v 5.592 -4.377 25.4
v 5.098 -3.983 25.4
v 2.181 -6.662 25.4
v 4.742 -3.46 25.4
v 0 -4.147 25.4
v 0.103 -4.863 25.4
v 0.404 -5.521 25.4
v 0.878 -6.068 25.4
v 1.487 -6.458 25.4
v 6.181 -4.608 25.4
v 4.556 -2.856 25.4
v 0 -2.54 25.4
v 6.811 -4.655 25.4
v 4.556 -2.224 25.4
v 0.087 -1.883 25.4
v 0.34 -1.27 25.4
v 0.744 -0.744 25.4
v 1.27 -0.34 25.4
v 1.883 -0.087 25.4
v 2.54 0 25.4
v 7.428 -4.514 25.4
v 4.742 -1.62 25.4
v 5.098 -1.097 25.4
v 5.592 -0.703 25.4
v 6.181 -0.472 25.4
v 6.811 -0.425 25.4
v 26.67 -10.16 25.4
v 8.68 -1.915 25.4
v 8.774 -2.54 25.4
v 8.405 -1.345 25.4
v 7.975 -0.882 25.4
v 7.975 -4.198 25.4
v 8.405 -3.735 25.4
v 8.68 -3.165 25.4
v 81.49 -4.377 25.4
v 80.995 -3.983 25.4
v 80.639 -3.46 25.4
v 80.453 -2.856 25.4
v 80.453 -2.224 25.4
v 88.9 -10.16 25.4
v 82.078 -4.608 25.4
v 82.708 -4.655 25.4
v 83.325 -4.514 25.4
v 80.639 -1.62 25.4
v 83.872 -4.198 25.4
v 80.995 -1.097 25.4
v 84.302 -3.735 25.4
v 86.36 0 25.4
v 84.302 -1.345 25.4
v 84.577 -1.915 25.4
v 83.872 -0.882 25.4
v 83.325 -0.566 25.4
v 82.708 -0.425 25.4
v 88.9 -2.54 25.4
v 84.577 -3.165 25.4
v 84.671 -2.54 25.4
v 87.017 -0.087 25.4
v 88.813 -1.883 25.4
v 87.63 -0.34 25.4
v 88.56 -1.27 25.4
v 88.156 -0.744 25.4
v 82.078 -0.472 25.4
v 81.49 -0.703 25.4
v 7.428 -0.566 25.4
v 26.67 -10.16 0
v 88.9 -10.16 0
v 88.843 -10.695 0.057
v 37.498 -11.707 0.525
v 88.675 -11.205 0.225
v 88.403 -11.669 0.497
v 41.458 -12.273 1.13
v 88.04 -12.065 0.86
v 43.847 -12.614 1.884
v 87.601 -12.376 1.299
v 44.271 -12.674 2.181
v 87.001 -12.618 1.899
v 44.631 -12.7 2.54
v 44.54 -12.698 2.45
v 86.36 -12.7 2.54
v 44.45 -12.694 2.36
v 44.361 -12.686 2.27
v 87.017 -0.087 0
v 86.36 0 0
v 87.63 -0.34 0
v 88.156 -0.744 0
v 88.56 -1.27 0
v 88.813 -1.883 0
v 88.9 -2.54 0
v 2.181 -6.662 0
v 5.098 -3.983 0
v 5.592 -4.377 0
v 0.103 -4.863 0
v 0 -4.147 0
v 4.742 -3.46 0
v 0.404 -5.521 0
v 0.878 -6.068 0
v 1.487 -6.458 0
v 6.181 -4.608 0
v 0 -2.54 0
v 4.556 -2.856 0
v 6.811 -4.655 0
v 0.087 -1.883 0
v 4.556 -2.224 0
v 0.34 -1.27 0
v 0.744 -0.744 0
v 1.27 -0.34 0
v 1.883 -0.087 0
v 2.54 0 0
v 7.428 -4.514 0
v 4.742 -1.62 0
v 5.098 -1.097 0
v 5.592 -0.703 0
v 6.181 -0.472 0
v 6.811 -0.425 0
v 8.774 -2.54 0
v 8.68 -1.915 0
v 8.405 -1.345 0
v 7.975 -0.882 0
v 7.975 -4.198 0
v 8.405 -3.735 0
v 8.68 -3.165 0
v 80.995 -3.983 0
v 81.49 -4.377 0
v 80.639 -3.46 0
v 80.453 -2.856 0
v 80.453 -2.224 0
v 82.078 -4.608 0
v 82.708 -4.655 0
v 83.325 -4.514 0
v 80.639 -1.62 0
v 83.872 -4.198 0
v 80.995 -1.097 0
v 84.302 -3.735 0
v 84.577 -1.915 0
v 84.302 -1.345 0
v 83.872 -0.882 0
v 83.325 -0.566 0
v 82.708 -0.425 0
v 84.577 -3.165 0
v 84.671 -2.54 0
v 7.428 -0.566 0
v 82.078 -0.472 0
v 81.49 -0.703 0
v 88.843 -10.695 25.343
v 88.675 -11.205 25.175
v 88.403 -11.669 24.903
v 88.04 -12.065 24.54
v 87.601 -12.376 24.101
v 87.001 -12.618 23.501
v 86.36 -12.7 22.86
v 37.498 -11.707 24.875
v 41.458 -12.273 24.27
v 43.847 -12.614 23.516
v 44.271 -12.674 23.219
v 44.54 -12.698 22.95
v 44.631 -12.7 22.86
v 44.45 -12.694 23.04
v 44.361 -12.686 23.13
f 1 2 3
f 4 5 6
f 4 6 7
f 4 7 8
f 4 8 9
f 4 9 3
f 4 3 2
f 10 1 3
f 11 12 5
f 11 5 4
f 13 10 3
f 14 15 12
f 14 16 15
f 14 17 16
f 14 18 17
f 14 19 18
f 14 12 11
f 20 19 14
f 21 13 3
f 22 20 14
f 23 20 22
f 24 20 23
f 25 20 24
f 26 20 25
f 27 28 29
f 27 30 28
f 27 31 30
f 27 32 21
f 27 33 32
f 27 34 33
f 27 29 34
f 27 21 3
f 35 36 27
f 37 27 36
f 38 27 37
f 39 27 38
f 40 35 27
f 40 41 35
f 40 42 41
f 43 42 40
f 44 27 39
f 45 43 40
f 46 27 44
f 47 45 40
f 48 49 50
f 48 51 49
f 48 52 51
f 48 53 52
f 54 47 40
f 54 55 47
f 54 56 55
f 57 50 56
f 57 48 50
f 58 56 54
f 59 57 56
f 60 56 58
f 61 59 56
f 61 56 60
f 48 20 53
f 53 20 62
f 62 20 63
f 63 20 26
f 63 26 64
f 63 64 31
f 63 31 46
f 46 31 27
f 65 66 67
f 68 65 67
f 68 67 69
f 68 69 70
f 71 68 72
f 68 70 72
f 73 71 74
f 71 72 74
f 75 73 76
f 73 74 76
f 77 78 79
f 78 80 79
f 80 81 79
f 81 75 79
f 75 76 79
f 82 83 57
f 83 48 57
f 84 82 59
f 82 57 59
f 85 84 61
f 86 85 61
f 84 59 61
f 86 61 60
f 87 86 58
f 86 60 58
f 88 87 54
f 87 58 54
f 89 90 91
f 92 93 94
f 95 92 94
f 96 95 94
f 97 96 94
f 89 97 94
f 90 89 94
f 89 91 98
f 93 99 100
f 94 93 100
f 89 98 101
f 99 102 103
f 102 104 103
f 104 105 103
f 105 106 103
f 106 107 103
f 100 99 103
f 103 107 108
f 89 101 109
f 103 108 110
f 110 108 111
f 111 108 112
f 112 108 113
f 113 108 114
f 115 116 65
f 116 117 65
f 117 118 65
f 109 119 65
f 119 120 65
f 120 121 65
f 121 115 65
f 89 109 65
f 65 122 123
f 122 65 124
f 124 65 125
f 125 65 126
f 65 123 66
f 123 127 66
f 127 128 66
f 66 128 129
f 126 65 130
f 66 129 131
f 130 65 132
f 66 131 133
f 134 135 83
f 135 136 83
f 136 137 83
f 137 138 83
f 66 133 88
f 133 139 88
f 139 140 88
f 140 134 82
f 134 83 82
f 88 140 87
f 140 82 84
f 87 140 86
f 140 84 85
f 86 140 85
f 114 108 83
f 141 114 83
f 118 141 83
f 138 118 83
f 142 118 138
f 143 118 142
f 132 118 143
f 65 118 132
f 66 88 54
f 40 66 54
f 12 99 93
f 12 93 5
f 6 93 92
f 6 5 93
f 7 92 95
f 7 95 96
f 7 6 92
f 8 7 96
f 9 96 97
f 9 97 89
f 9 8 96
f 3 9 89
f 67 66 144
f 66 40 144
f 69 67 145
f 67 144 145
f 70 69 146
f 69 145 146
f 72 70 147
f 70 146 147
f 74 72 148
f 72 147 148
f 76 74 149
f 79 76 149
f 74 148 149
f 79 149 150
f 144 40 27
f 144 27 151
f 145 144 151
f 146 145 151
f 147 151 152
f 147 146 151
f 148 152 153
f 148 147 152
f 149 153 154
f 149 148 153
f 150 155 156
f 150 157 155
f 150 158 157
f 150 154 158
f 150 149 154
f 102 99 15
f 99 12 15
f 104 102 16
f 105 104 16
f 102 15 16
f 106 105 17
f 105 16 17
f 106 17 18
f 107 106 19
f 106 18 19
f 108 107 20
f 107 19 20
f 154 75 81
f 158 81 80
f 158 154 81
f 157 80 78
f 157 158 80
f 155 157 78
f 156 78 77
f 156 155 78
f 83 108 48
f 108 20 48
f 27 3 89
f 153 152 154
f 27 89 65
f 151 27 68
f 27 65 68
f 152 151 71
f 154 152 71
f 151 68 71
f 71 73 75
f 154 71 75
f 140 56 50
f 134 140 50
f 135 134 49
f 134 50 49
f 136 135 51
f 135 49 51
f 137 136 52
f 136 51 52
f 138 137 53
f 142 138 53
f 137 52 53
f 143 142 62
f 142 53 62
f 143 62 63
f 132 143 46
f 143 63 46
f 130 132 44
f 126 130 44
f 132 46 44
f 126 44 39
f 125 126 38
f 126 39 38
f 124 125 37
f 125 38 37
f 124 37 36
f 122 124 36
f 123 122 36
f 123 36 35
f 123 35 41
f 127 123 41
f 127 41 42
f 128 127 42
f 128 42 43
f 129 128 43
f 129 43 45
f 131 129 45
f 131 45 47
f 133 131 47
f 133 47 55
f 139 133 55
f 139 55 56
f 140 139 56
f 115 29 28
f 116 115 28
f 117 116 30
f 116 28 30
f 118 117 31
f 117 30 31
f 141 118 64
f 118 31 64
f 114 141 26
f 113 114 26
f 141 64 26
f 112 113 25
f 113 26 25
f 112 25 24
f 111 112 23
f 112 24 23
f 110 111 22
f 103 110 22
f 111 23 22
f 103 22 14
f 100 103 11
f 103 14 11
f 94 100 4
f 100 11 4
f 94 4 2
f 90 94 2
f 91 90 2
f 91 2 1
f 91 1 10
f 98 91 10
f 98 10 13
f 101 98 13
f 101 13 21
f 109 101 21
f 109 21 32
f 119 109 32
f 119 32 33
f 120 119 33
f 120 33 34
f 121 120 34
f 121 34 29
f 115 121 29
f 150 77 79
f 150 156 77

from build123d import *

# Parameters (mm, degrees)
F0_W     = 88.9
F0_H     = 25.4
F1_DEPTH = 12.7
F3_DEPTH = 25.4
F4_R     = 2.54
F5_R     = 2.1209
F6_DEPTH = 26.162


with BuildPart() as f1:
    # F0 (on Front) → F1 (new body)
    with BuildSketch(Plane.XZ):
        with Locations((44.45, 12.7)):
            Rectangle(F0_W, F0_H)
    extrude(amount=F1_DEPTH)

    # F2 (on face) → F3 (cut)
    with BuildSketch(Plane(origin=(0, 0, 0), x_dir=(1, 0, 0), z_dir=(0, 0, -1))):
        Polygon((0, 6.35), (44.45, 12.7), (0, 12.7), align=None)
    extrude(amount=-F3_DEPTH, mode=Mode.SUBTRACT)

    # F4
    f4_edges = [f1.edges().sort_by_distance(p)[0] for p in [
        (0, 0, 12.7),
        (0, -6.35, 12.7),
        (88.9, 0, 12.7),
        (66.675, -12.7, 0),
        (66.675, -12.7, 25.4),
        (88.9, -12.7, 12.7),
        (44.45, -12.7, 12.7),
    ]]
    fillet(f4_edges, radius=F4_R)

    # F5 (on face) → F6 (cut)
    with BuildSketch(Plane.XY.offset(25.4)):
        with Locations((82.55, -2.54)):
            Circle(F5_R)
        with Locations((6.6528792481, -2.54)):
            Circle(F5_R)
    extrude(amount=-F6_DEPTH, mode=Mode.SUBTRACT)


solid = f1.part
